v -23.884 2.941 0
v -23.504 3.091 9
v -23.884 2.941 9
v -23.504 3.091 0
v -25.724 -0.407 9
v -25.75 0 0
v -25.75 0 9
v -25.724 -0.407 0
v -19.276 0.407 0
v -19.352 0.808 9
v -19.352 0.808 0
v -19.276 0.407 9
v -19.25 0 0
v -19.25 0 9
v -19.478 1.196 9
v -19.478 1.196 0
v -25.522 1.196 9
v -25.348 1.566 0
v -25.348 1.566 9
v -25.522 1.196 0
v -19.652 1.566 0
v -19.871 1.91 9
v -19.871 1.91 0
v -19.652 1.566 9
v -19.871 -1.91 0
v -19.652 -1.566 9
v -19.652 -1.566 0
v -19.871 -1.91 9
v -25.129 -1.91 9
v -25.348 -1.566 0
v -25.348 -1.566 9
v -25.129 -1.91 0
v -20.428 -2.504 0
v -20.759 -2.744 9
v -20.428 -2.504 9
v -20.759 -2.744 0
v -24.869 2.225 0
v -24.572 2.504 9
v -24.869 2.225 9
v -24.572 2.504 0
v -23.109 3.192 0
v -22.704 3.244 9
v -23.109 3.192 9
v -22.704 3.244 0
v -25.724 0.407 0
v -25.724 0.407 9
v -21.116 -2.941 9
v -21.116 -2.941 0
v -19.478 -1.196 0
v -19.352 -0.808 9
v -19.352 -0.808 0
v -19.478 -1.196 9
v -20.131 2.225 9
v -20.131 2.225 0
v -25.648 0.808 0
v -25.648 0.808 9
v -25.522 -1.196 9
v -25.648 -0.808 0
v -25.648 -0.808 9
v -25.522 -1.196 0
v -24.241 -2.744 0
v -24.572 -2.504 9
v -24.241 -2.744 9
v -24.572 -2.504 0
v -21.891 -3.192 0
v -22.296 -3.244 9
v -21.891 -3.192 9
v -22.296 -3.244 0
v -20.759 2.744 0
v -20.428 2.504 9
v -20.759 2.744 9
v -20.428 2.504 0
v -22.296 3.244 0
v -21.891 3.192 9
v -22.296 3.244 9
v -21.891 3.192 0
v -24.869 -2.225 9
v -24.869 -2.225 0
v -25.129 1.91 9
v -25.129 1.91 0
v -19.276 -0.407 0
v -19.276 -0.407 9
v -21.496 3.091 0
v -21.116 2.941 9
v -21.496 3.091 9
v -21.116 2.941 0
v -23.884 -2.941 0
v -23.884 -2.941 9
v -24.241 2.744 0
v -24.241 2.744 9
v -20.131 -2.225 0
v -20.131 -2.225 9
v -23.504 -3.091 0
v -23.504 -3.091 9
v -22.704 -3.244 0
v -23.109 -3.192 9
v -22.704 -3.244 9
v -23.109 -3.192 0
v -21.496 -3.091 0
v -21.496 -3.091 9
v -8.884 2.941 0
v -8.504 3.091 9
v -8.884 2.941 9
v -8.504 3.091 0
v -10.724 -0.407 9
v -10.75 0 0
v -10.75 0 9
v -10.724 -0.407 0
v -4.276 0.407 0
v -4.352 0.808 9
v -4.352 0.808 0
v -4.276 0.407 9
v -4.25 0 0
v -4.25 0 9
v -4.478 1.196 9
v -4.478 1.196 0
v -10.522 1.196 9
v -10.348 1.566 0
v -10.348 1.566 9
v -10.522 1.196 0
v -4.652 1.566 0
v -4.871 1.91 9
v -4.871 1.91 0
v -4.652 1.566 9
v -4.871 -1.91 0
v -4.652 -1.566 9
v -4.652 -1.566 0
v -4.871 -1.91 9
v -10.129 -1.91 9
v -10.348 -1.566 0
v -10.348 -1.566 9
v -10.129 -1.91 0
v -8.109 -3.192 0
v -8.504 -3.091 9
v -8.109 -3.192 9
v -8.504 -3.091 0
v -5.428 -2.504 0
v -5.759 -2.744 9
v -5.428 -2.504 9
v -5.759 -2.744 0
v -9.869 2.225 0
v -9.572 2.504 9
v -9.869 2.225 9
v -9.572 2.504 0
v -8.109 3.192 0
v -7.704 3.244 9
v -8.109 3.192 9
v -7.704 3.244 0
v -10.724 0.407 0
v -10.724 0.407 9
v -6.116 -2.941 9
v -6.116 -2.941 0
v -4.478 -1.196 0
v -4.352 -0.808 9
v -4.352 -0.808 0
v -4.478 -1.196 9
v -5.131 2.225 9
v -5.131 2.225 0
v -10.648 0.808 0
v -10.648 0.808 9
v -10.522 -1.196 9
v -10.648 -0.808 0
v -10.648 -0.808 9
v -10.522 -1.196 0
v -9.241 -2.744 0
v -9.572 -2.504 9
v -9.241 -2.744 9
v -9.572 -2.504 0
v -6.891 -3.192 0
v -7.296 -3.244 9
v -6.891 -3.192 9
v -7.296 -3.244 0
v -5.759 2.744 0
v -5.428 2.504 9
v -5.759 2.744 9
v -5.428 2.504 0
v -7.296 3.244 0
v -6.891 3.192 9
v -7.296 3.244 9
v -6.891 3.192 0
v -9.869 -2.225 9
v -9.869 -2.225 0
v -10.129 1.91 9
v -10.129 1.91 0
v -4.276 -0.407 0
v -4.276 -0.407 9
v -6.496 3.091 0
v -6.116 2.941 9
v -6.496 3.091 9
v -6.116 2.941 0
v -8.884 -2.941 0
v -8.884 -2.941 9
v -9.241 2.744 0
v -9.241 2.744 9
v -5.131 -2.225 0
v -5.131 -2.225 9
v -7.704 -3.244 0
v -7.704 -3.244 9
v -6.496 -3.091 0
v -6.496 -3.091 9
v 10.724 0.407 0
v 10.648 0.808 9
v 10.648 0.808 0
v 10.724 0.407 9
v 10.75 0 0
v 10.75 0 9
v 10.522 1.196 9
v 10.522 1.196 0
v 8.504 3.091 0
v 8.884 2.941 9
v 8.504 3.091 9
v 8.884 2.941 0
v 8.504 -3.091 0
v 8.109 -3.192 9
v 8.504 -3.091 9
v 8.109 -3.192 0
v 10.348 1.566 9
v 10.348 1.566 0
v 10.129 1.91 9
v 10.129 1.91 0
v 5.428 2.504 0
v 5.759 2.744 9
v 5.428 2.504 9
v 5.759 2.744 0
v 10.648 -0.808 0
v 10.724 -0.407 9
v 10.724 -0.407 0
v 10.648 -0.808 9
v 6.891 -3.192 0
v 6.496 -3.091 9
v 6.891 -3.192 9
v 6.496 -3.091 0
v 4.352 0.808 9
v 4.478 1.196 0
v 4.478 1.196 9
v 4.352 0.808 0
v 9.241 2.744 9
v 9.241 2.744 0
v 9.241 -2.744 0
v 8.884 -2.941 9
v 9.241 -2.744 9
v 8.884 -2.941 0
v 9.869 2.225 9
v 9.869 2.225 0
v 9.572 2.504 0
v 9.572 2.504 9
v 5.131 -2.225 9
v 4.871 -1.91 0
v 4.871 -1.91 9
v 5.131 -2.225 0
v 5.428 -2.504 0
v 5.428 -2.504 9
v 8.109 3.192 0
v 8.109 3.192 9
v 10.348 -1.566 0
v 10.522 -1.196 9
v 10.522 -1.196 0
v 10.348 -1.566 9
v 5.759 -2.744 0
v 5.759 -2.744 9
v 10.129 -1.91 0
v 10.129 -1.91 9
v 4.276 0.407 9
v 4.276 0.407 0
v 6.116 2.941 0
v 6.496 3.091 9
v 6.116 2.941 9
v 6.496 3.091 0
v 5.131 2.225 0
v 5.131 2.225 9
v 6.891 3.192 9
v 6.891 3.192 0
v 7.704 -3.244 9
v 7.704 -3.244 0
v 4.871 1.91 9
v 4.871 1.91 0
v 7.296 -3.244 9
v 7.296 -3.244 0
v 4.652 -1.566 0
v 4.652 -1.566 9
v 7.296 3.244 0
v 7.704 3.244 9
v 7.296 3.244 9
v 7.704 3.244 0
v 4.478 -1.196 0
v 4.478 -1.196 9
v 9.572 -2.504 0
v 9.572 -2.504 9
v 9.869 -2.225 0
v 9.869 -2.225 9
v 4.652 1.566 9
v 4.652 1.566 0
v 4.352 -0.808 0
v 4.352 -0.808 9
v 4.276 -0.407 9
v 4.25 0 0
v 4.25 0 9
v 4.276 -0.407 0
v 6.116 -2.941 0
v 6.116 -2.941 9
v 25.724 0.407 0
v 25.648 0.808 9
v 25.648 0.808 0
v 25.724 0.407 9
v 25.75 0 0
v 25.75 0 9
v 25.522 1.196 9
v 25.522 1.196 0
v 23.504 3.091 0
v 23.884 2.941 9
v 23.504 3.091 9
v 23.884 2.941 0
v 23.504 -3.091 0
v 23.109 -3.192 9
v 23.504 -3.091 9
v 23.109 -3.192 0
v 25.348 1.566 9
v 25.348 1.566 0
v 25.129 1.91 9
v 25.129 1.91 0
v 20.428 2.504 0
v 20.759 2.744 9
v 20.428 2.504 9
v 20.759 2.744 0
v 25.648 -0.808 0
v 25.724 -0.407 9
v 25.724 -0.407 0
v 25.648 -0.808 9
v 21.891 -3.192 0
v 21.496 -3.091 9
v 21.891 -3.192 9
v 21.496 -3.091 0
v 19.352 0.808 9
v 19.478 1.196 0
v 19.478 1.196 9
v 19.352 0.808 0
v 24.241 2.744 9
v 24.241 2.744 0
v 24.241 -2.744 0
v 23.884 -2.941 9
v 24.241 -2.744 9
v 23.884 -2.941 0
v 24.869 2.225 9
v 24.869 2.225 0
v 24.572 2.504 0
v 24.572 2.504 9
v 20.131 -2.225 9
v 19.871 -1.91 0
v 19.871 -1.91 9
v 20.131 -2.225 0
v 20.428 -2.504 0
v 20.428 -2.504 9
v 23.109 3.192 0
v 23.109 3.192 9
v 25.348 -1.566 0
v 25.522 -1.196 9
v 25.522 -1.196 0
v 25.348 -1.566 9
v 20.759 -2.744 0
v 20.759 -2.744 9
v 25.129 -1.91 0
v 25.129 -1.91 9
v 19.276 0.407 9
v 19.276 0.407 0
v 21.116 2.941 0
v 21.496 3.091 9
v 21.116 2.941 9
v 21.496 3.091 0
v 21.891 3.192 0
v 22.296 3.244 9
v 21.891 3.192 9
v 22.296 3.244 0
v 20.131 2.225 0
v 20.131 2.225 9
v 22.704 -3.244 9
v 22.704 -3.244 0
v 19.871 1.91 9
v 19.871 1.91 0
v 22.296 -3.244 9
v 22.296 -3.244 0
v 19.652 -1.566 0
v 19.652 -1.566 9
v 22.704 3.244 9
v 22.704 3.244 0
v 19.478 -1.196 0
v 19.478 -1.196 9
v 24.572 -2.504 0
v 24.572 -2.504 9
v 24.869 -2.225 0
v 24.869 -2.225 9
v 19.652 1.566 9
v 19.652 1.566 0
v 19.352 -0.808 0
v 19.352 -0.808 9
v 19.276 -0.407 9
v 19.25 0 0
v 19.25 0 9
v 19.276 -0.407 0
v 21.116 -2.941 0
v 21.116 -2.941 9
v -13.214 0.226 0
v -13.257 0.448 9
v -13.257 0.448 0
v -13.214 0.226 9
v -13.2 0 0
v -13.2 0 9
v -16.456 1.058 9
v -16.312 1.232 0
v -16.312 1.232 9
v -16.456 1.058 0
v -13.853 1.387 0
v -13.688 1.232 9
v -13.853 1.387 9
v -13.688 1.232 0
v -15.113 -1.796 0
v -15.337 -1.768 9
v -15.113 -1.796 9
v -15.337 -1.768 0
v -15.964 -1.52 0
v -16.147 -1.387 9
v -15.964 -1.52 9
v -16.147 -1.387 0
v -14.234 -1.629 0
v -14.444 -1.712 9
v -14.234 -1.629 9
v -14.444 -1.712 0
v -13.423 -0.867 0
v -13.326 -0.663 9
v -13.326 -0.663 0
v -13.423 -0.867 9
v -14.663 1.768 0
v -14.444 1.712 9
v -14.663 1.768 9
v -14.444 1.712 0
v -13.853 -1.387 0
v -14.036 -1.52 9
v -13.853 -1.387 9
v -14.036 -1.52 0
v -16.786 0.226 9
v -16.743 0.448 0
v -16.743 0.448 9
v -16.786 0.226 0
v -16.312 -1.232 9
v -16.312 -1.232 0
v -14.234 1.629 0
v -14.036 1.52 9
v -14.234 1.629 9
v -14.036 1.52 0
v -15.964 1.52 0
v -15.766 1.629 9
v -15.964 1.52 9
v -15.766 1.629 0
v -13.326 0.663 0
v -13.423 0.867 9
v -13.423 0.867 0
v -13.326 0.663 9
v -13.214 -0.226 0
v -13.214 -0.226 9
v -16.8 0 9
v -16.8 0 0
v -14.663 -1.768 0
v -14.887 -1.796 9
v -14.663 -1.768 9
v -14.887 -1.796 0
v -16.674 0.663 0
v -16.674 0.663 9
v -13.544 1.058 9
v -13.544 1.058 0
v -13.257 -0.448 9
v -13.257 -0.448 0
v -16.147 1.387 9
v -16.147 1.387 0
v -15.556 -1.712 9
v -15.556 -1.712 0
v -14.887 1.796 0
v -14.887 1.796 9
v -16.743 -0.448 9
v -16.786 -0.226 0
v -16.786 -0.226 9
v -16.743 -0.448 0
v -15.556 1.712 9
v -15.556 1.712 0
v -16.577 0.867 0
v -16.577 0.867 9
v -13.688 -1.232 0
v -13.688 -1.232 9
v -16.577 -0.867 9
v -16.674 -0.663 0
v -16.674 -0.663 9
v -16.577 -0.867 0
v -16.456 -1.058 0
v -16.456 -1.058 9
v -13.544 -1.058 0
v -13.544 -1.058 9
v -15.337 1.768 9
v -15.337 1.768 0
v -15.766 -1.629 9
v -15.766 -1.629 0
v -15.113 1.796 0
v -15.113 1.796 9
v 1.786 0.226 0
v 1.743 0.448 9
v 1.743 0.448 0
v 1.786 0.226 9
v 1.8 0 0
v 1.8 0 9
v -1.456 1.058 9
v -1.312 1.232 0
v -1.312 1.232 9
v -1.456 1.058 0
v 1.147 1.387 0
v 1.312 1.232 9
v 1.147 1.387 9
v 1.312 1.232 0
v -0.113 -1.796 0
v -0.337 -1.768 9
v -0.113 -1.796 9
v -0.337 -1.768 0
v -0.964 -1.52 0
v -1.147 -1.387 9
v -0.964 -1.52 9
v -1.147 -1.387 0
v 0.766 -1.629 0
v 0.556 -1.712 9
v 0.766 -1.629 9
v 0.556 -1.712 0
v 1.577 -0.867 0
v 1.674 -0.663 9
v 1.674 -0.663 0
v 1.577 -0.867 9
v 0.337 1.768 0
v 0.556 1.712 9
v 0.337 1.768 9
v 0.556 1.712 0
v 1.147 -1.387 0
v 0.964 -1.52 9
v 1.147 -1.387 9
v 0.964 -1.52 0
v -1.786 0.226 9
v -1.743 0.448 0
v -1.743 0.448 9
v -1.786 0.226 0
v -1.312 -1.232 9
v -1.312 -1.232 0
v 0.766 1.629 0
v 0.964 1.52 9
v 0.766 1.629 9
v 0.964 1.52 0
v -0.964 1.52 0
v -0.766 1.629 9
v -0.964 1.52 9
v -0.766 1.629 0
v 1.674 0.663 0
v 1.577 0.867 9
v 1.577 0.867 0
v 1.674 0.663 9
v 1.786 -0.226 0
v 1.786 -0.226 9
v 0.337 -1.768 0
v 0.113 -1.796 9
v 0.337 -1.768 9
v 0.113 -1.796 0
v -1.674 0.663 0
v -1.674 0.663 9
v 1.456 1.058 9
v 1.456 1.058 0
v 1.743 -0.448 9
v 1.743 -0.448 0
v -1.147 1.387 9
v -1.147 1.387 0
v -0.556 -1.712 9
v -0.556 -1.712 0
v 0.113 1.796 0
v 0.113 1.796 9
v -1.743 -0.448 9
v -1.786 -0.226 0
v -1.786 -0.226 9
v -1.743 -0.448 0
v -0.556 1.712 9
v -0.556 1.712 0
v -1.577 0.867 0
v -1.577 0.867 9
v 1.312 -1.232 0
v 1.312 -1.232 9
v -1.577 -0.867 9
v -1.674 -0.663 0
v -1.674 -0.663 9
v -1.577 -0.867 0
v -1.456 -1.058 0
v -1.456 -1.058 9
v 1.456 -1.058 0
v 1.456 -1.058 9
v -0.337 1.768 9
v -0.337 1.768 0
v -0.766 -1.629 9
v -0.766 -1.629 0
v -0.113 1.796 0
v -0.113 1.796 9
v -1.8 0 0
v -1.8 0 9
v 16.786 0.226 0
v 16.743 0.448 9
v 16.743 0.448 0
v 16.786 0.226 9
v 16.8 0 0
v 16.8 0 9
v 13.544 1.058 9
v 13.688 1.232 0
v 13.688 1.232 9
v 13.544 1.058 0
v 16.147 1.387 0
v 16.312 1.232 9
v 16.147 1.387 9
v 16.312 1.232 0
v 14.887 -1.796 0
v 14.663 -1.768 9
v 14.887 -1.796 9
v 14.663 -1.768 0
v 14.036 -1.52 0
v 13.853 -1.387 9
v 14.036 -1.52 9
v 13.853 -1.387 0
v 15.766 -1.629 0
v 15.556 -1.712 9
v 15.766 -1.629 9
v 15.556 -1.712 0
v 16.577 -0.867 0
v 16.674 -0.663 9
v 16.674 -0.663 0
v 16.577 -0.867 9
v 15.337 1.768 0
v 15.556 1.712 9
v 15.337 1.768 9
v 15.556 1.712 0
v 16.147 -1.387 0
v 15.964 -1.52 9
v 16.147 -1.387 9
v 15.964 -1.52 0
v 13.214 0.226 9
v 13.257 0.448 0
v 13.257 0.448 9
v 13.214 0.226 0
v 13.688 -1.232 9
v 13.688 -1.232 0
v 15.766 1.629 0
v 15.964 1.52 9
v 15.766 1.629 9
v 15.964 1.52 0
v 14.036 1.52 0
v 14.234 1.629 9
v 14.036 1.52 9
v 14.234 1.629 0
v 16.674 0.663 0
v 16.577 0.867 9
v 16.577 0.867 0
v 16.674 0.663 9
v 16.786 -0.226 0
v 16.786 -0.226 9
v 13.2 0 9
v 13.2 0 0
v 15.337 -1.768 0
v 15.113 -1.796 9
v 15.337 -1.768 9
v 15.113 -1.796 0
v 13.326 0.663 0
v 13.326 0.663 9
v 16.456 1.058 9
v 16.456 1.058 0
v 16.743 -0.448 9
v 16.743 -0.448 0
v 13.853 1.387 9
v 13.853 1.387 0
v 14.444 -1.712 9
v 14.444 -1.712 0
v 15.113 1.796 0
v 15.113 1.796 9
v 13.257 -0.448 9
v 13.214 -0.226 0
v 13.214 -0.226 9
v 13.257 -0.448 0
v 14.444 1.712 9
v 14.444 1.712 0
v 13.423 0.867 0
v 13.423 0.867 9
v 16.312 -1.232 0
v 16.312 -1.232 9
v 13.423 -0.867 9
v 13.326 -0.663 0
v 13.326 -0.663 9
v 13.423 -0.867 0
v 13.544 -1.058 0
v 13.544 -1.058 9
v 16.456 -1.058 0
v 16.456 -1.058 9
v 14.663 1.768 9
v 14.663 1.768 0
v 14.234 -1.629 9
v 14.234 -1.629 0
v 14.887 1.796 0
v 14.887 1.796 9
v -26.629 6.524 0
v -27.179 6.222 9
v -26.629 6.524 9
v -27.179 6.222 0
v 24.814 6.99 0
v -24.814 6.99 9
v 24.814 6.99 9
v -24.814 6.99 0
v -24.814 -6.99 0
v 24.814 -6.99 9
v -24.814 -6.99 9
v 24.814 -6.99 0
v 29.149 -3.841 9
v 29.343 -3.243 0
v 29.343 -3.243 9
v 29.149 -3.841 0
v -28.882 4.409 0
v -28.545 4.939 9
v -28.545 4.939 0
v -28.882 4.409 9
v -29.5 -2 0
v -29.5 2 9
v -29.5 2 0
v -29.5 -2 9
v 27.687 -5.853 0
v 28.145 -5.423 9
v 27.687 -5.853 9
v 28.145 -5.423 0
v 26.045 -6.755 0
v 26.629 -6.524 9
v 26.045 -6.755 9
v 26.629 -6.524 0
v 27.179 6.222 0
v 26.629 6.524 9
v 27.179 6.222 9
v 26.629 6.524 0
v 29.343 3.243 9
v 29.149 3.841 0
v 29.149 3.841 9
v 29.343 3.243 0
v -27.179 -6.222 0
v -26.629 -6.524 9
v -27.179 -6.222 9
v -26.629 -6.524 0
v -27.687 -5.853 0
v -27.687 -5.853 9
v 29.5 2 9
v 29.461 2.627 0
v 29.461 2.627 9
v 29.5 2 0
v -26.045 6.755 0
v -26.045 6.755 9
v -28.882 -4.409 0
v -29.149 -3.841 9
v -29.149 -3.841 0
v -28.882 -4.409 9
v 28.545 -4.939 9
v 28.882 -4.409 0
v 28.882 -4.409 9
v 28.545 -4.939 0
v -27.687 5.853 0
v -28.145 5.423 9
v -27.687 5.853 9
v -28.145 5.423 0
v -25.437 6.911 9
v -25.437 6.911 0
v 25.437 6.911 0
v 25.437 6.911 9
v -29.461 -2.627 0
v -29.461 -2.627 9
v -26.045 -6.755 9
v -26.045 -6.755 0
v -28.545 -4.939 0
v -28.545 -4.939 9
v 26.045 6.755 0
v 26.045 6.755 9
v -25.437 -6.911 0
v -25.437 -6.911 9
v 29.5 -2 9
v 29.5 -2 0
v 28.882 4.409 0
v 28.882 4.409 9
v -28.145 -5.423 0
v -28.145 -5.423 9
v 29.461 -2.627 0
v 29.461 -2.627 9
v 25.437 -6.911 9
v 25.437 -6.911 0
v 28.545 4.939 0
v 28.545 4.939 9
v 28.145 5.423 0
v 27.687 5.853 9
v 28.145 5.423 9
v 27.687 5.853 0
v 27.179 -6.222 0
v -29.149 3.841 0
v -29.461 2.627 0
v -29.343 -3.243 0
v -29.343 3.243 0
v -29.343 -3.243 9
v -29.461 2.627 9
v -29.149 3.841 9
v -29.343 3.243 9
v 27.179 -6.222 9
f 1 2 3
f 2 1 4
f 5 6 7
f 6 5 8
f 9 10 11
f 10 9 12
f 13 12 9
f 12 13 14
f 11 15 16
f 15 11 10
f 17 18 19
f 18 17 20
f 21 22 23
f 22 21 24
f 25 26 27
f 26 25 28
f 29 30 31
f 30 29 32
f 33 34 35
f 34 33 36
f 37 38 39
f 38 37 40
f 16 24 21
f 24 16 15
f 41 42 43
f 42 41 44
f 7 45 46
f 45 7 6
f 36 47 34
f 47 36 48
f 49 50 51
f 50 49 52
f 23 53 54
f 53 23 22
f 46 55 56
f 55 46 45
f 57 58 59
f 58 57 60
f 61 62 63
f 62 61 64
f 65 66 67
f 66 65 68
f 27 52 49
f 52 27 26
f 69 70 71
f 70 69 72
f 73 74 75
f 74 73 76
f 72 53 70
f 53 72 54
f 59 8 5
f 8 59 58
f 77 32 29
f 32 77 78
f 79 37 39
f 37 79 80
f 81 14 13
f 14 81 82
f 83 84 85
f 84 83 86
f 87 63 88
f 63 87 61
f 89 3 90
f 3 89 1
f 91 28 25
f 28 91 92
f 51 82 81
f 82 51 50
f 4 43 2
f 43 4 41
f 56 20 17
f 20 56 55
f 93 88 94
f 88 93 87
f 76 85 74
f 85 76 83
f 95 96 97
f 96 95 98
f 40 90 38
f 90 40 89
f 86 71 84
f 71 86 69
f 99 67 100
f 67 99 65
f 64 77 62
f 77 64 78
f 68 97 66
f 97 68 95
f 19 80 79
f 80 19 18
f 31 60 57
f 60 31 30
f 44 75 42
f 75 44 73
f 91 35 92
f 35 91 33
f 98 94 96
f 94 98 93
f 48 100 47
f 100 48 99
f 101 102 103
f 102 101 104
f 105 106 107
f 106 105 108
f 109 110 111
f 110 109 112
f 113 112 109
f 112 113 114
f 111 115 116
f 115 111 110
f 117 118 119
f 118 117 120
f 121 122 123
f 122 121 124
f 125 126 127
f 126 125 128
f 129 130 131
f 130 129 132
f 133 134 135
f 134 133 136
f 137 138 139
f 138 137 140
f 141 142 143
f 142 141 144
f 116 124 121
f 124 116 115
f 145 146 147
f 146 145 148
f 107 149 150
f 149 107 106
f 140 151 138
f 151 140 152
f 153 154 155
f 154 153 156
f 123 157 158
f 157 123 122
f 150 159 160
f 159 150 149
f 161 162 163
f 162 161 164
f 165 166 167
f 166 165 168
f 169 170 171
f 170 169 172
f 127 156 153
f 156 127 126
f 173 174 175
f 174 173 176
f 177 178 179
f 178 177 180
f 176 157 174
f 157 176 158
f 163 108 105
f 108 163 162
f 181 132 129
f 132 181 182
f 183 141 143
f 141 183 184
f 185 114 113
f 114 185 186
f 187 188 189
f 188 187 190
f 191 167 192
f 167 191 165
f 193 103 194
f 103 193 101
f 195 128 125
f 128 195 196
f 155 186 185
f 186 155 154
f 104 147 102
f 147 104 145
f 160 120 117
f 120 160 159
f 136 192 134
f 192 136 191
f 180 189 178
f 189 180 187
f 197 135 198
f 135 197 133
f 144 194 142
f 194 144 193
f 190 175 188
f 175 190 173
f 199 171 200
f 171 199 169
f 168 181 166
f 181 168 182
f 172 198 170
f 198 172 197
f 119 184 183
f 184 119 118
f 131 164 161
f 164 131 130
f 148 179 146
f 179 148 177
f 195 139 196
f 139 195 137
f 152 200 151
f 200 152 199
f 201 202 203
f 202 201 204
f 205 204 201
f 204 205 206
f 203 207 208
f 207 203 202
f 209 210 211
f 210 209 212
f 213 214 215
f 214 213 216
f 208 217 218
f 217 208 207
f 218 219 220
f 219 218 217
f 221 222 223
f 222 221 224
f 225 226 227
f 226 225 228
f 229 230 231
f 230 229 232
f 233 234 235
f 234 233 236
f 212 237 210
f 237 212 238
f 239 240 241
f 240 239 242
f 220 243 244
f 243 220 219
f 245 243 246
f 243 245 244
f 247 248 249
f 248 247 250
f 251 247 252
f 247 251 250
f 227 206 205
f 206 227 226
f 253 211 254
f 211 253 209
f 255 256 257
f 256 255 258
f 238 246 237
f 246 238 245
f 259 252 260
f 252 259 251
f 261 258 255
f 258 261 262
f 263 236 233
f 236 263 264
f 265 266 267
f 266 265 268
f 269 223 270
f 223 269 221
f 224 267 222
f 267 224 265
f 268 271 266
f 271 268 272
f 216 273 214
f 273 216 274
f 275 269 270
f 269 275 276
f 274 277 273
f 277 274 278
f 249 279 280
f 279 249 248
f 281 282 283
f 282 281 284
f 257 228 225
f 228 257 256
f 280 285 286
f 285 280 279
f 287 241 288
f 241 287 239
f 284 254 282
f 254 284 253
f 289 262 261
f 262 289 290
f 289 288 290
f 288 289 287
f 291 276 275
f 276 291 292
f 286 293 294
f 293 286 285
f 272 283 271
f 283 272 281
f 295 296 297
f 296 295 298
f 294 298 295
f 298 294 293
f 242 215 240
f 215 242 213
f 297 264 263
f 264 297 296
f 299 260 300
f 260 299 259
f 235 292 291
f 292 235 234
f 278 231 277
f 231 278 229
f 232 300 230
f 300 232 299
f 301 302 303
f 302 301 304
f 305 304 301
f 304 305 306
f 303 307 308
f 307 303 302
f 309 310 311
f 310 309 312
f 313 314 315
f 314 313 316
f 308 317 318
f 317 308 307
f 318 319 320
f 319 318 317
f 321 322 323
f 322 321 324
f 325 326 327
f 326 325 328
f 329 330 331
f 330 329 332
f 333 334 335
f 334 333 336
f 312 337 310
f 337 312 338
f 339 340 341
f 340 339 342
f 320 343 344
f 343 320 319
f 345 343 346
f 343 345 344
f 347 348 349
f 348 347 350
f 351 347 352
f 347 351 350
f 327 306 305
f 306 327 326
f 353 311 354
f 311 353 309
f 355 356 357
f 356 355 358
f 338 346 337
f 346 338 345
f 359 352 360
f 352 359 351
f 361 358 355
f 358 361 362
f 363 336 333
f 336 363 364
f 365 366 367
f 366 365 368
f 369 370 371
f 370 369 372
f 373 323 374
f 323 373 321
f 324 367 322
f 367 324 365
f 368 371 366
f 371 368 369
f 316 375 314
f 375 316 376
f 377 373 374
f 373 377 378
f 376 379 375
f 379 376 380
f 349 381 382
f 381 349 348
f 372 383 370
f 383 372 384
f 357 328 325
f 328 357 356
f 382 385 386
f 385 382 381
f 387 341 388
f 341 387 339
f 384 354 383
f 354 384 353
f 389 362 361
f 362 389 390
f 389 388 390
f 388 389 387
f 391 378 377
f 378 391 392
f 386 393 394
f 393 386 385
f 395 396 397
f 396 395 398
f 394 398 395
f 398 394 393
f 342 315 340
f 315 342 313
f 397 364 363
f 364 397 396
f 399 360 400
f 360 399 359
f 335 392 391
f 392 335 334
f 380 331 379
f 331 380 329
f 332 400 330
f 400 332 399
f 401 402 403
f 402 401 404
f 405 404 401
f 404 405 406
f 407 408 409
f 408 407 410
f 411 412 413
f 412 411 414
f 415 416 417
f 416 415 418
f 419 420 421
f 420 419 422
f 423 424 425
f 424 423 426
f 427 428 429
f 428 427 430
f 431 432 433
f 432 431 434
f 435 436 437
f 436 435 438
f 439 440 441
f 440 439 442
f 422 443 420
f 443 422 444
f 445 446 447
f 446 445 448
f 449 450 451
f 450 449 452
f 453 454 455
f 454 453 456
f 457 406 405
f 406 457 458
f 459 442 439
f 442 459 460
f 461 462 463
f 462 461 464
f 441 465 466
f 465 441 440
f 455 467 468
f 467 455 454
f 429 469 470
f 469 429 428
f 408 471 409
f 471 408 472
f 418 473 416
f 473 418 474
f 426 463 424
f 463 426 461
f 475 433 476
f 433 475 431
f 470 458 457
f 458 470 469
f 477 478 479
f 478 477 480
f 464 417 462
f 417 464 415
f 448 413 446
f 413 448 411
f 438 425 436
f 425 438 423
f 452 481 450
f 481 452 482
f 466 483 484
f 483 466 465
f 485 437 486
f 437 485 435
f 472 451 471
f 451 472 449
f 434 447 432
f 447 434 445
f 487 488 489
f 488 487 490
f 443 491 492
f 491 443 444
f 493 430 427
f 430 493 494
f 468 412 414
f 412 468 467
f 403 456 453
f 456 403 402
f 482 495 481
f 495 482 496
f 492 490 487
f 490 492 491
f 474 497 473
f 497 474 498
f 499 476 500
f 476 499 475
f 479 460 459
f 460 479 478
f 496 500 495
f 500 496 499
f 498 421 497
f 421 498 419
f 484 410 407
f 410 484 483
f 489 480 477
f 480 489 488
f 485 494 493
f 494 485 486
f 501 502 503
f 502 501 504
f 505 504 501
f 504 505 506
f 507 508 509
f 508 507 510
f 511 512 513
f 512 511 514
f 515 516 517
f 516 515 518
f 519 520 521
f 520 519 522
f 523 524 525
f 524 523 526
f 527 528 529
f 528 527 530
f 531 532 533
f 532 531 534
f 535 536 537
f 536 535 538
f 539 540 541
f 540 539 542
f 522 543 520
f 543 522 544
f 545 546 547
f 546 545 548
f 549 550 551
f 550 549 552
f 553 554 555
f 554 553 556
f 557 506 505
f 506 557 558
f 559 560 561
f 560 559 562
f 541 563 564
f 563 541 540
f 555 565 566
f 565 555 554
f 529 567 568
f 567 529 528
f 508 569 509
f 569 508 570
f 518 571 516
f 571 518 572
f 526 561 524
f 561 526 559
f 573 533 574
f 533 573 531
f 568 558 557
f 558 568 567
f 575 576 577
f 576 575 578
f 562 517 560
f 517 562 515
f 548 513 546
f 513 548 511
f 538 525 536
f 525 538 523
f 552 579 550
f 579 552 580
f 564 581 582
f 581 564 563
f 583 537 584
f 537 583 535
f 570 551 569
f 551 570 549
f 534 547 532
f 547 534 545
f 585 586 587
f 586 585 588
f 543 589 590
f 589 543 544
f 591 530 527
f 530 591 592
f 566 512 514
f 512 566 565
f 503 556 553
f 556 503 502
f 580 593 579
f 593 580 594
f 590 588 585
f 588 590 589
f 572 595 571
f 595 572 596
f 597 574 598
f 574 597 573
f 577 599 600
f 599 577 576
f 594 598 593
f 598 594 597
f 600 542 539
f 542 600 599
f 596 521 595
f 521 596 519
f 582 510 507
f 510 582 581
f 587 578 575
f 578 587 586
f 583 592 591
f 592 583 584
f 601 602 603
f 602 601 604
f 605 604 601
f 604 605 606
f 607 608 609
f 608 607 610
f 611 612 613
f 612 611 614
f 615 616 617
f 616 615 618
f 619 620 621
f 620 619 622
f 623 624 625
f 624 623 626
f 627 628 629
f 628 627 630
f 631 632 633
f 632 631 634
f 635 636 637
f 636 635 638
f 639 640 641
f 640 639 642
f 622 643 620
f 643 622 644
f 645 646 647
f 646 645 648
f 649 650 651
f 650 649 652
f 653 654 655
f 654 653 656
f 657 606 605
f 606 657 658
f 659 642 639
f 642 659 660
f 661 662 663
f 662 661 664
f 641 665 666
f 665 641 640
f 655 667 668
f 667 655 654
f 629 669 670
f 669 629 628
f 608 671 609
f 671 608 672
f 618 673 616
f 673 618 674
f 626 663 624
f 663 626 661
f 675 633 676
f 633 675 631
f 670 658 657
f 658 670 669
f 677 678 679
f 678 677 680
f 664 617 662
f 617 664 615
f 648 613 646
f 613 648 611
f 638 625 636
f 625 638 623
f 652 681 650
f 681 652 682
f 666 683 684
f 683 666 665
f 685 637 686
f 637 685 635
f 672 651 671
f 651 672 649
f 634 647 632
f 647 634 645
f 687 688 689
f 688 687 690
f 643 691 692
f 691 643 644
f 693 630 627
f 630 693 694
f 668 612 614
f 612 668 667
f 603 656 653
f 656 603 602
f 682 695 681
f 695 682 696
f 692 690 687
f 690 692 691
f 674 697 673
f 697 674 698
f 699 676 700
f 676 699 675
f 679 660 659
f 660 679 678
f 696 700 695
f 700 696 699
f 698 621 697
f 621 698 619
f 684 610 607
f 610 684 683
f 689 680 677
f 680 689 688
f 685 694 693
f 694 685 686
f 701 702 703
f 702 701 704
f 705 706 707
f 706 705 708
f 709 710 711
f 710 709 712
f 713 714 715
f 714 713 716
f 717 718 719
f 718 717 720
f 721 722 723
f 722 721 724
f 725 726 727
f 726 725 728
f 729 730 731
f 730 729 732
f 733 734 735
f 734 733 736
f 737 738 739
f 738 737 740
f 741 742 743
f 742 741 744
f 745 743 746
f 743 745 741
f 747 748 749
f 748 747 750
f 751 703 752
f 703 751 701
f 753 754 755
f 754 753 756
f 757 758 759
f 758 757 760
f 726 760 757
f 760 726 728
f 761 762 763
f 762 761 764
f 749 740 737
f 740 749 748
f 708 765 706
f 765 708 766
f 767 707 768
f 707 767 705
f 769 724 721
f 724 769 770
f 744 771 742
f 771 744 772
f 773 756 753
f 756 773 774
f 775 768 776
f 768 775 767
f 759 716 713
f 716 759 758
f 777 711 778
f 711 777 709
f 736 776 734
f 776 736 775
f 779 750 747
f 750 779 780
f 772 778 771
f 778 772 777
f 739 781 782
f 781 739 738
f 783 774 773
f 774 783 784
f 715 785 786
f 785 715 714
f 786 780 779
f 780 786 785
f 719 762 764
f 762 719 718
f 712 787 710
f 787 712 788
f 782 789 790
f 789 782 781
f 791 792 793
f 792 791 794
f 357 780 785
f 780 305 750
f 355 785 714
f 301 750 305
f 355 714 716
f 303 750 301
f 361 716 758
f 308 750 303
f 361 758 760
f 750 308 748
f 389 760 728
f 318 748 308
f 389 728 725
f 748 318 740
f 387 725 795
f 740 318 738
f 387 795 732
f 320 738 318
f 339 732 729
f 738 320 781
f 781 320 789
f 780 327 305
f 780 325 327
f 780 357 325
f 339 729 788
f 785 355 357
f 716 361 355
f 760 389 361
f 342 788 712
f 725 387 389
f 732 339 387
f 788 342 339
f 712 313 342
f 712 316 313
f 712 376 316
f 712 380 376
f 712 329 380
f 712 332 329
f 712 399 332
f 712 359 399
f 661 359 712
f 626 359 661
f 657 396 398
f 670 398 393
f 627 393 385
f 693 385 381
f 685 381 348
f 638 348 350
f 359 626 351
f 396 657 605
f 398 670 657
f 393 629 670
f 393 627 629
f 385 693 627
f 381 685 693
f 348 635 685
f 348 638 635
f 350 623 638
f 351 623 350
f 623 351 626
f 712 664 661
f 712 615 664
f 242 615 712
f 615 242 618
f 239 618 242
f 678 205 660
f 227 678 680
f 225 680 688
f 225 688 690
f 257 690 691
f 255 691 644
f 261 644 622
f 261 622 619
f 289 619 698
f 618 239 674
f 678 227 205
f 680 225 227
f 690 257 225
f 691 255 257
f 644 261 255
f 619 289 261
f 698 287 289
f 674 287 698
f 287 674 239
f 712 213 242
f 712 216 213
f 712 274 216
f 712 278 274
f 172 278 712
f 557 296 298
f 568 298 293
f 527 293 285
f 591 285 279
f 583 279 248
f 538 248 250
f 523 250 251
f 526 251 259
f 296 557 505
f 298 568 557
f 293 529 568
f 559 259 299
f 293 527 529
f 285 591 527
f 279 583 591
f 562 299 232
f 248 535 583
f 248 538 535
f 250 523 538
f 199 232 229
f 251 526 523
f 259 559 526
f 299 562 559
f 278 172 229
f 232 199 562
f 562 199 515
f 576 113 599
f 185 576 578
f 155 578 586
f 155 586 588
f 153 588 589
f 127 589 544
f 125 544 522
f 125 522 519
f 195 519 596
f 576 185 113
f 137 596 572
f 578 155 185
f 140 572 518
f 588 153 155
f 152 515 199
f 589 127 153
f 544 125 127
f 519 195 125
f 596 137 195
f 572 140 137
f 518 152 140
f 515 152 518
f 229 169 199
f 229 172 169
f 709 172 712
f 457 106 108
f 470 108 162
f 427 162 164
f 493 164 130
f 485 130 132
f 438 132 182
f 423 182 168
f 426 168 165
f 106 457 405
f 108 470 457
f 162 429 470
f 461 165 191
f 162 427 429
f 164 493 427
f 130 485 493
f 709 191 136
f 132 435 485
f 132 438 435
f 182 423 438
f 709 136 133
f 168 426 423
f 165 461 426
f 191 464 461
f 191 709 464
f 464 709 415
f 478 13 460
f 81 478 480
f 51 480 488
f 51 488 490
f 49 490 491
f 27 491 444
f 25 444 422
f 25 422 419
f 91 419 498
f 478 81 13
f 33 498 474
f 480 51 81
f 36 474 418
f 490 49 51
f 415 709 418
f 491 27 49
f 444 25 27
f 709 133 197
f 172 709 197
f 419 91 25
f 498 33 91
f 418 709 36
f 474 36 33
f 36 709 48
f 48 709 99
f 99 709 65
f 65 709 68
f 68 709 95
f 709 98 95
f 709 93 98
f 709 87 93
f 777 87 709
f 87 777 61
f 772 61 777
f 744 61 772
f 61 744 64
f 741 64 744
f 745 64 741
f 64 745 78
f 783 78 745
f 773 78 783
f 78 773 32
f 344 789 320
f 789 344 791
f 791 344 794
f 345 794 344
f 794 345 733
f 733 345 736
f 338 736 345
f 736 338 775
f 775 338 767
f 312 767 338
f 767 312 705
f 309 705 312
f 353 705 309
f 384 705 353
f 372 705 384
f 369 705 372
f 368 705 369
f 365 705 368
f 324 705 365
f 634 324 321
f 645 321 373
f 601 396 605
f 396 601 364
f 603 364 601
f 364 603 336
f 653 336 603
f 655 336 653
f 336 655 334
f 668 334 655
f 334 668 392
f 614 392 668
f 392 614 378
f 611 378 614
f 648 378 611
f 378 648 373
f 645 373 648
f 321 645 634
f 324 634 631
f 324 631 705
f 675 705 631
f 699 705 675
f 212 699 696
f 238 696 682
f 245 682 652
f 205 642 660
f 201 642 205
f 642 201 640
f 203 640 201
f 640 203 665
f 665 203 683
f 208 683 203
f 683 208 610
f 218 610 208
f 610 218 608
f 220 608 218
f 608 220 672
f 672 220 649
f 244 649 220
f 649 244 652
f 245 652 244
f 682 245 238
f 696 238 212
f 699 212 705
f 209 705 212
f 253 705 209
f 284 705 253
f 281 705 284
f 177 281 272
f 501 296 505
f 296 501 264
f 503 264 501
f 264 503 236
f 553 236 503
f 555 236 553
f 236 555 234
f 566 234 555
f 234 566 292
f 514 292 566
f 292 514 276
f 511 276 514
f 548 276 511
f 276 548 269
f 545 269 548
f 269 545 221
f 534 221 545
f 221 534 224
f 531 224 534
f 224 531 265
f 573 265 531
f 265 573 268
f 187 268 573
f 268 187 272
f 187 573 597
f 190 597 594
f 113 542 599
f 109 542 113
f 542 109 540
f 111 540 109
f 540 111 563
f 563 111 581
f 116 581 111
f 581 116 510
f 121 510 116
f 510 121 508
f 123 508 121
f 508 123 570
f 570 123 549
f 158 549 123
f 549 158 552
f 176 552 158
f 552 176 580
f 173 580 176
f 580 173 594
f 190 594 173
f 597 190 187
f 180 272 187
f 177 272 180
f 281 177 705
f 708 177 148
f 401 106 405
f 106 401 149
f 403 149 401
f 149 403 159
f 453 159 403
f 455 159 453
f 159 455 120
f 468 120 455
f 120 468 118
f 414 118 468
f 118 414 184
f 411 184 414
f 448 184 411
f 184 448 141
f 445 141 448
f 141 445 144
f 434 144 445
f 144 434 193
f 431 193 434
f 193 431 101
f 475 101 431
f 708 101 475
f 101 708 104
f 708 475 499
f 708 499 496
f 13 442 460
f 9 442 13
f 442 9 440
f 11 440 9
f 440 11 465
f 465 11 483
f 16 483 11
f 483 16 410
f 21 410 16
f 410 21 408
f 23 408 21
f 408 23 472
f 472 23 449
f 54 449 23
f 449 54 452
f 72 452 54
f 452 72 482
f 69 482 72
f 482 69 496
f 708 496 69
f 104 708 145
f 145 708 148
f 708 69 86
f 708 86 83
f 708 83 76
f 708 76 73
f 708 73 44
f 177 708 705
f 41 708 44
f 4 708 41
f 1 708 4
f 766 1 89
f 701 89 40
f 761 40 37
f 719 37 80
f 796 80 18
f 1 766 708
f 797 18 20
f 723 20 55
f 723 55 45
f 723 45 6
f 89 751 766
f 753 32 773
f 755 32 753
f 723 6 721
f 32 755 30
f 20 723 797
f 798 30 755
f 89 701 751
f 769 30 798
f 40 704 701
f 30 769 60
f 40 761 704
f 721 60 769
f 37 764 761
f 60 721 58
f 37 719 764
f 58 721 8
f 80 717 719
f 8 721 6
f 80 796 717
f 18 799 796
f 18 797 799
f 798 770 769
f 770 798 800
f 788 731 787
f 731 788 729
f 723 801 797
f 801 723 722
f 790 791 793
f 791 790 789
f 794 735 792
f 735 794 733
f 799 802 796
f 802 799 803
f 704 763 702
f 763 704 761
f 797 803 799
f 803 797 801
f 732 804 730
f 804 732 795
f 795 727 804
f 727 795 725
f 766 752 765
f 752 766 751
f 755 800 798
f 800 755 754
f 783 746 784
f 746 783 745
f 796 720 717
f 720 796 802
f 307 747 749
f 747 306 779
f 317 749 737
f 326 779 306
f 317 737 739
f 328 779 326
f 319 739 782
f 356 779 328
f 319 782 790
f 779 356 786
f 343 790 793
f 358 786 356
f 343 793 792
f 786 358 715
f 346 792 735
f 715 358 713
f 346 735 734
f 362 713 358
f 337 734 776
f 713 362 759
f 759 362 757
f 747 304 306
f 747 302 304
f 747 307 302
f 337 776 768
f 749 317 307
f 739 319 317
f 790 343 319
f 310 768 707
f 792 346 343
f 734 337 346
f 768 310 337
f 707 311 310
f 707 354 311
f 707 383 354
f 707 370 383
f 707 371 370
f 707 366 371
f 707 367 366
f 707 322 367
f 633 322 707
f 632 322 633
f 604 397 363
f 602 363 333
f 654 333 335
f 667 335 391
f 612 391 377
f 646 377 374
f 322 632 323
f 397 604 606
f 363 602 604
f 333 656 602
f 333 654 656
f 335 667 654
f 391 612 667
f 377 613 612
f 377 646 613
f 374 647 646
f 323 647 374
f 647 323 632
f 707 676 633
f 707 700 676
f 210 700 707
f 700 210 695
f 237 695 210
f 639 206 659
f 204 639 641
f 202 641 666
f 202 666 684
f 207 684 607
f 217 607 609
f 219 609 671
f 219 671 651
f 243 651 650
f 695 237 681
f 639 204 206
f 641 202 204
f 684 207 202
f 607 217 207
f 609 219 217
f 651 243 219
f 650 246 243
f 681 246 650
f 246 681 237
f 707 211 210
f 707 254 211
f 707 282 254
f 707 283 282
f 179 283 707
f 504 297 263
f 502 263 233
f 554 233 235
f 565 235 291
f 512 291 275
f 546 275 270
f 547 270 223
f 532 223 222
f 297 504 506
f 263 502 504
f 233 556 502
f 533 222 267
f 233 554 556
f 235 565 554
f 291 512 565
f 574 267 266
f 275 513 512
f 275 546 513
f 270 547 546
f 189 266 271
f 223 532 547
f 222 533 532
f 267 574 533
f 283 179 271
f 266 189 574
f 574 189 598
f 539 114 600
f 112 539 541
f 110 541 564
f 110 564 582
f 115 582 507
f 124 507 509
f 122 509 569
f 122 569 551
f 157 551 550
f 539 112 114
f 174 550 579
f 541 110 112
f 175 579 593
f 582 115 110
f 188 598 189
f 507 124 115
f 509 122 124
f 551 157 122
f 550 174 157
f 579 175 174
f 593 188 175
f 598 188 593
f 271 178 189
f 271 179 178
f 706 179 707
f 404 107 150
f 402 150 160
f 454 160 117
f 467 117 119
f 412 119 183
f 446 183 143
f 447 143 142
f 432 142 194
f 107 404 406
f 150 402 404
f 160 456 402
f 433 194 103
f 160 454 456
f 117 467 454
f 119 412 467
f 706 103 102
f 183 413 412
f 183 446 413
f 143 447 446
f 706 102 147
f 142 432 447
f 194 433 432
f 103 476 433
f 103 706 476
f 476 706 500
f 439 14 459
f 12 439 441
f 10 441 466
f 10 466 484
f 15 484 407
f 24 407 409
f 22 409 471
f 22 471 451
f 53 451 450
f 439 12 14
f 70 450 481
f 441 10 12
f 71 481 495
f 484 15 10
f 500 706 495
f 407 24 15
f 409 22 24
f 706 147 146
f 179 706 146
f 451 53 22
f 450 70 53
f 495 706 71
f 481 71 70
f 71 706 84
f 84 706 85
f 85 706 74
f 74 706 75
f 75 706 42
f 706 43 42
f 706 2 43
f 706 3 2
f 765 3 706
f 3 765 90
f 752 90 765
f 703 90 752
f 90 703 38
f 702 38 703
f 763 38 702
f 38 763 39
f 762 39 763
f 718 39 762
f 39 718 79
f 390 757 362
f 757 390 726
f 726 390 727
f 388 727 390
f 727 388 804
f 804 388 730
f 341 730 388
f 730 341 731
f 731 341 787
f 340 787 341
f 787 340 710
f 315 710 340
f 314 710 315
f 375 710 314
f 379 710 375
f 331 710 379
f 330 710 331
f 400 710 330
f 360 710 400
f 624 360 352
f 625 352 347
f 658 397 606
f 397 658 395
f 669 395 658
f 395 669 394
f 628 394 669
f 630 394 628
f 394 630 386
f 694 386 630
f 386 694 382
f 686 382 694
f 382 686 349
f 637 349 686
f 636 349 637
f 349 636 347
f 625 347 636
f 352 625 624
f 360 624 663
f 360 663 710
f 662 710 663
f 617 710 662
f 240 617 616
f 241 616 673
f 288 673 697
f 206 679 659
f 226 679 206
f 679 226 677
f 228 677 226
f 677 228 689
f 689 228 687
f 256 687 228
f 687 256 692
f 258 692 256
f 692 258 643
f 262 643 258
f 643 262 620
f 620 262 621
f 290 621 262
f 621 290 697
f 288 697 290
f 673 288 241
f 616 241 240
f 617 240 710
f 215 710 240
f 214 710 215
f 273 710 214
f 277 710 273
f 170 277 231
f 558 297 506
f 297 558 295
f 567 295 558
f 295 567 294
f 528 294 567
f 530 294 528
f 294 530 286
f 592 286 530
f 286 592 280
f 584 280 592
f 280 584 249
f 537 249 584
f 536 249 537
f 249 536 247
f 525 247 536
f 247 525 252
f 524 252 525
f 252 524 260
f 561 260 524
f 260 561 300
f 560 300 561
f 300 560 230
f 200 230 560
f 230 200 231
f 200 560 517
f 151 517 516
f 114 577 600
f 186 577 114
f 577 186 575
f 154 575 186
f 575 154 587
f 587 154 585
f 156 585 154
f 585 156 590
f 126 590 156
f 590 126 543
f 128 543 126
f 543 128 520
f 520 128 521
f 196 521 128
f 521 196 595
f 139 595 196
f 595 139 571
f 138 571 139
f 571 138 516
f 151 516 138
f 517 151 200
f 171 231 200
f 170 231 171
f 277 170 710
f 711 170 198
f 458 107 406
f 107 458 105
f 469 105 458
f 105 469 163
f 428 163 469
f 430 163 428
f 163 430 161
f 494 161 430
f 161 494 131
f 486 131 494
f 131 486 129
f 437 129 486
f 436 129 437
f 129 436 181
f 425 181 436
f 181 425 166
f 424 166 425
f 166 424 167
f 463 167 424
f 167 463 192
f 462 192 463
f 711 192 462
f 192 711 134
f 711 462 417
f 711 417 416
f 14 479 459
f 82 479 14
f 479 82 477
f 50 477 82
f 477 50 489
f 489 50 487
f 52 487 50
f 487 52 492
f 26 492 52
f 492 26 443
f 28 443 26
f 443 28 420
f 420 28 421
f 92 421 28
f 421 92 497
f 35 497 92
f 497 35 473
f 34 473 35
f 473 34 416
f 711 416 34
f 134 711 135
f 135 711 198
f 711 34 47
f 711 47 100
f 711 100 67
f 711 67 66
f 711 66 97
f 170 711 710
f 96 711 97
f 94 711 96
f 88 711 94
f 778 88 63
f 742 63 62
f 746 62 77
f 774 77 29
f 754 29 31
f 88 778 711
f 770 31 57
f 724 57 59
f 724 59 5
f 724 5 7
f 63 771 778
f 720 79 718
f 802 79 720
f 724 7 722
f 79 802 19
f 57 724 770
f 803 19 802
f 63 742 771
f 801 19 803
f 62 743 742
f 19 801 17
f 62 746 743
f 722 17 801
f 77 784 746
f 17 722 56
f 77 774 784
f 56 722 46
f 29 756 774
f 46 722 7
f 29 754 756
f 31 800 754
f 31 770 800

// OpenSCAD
$fn = 50;


difference() {
	union() {
		translate(v = [0, 0, 0]) {
			rotate(a = [0, 0, 0]) {
				hull() {
					translate(v = [-24.5000000000, 2.0000000000, 0]) {
						rotate(a = [0, 0, 0]) {
							translate(v = [0, 0, 0]) {
								rotate(a = [0, 0, 0]) {
									cylinder(h = 9, r = 5);
								}
							}
						}
					}
					translate(v = [24.5000000000, 2.0000000000, 0]) {
						rotate(a = [0, 0, 0]) {
							translate(v = [0, 0, 0]) {
								rotate(a = [0, 0, 0]) {
									cylinder(h = 9, r = 5);
								}
							}
						}
					}
					translate(v = [-24.5000000000, -2.0000000000, 0]) {
						rotate(a = [0, 0, 0]) {
							translate(v = [0, 0, 0]) {
								rotate(a = [0, 0, 0]) {
									cylinder(h = 9, r = 5);
								}
							}
						}
					}
					translate(v = [24.5000000000, -2.0000000000, 0]) {
						rotate(a = [0, 0, 0]) {
							translate(v = [0, 0, 0]) {
								rotate(a = [0, 0, 0]) {
									cylinder(h = 9, r = 5);
								}
							}
						}
					}
				}
			}
		}
	}
	union() {
		translate(v = [-22.5000000000, 0.0000000000, 0]) {
			rotate(a = [0, 0, 0]) {
				translate(v = [0, 0, -50]) {
					rotate(a = [0, 0, 0]) {
						cylinder(h = 100, r = 3.2500000000);
					}
				}
			}
		}
		translate(v = [-7.5000000000, 0.0000000000, 0]) {
			rotate(a = [0, 0, 0]) {
				translate(v = [0, 0, -50]) {
					rotate(a = [0, 0, 0]) {
						cylinder(h = 100, r = 3.2500000000);
					}
				}
			}
		}
		translate(v = [7.5000000000, 0.0000000000, 0]) {
			rotate(a = [0, 0, 0]) {
				translate(v = [0, 0, -50]) {
					rotate(a = [0, 0, 0]) {
						cylinder(h = 100, r = 3.2500000000);
					}
				}
			}
		}
		translate(v = [22.5000000000, 0.0000000000, 0]) {
			rotate(a = [0, 0, 0]) {
				translate(v = [0, 0, -50]) {
					rotate(a = [0, 0, 0]) {
						cylinder(h = 100, r = 3.2500000000);
					}
				}
			}
		}
		translate(v = [-22.5000000000, 0.0000000000, 0]) {
			rotate(a = [0, 0, 0]) {
				translate(v = [0, 0, -50]) {
					rotate(a = [0, 0, 0]) {
						cylinder(h = 100, r = 1.8000000000);
					}
				}
			}
		}
		translate(v = [-15.0000000000, 0.0000000000, 0]) {
			rotate(a = [0, 0, 0]) {
				translate(v = [0, 0, -50]) {
					rotate(a = [0, 0, 0]) {
						cylinder(h = 100, r = 1.8000000000);
					}
				}
			}
		}
		translate(v = [-7.5000000000, 0.0000000000, 0]) {
			rotate(a = [0, 0, 0]) {
				translate(v = [0, 0, -50]) {
					rotate(a = [0, 0, 0]) {
						cylinder(h = 100, r = 1.8000000000);
					}
				}
			}
		}
		translate(v = [0.0000000000, 0.0000000000, 0]) {
			rotate(a = [0, 0, 0]) {
				translate(v = [0, 0, -50]) {
					rotate(a = [0, 0, 0]) {
						cylinder(h = 100, r = 1.8000000000);
					}
				}
			}
		}
		translate(v = [7.5000000000, 0.0000000000, 0]) {
			rotate(a = [0, 0, 0]) {
				translate(v = [0, 0, -50]) {
					rotate(a = [0, 0, 0]) {
						cylinder(h = 100, r = 1.8000000000);
					}
				}
			}
		}
		translate(v = [15.0000000000, 0.0000000000, 0]) {
			rotate(a = [0, 0, 0]) {
				translate(v = [0, 0, -50]) {
					rotate(a = [0, 0, 0]) {
						cylinder(h = 100, r = 1.8000000000);
					}
				}
			}
		}
		translate(v = [22.5000000000, 0.0000000000, 0]) {
			rotate(a = [0, 0, 0]) {
				translate(v = [0, 0, -50]) {
					rotate(a = [0, 0, 0]) {
						cylinder(h = 100, r = 1.8000000000);
					}
				}
			}
		}
	}
}
